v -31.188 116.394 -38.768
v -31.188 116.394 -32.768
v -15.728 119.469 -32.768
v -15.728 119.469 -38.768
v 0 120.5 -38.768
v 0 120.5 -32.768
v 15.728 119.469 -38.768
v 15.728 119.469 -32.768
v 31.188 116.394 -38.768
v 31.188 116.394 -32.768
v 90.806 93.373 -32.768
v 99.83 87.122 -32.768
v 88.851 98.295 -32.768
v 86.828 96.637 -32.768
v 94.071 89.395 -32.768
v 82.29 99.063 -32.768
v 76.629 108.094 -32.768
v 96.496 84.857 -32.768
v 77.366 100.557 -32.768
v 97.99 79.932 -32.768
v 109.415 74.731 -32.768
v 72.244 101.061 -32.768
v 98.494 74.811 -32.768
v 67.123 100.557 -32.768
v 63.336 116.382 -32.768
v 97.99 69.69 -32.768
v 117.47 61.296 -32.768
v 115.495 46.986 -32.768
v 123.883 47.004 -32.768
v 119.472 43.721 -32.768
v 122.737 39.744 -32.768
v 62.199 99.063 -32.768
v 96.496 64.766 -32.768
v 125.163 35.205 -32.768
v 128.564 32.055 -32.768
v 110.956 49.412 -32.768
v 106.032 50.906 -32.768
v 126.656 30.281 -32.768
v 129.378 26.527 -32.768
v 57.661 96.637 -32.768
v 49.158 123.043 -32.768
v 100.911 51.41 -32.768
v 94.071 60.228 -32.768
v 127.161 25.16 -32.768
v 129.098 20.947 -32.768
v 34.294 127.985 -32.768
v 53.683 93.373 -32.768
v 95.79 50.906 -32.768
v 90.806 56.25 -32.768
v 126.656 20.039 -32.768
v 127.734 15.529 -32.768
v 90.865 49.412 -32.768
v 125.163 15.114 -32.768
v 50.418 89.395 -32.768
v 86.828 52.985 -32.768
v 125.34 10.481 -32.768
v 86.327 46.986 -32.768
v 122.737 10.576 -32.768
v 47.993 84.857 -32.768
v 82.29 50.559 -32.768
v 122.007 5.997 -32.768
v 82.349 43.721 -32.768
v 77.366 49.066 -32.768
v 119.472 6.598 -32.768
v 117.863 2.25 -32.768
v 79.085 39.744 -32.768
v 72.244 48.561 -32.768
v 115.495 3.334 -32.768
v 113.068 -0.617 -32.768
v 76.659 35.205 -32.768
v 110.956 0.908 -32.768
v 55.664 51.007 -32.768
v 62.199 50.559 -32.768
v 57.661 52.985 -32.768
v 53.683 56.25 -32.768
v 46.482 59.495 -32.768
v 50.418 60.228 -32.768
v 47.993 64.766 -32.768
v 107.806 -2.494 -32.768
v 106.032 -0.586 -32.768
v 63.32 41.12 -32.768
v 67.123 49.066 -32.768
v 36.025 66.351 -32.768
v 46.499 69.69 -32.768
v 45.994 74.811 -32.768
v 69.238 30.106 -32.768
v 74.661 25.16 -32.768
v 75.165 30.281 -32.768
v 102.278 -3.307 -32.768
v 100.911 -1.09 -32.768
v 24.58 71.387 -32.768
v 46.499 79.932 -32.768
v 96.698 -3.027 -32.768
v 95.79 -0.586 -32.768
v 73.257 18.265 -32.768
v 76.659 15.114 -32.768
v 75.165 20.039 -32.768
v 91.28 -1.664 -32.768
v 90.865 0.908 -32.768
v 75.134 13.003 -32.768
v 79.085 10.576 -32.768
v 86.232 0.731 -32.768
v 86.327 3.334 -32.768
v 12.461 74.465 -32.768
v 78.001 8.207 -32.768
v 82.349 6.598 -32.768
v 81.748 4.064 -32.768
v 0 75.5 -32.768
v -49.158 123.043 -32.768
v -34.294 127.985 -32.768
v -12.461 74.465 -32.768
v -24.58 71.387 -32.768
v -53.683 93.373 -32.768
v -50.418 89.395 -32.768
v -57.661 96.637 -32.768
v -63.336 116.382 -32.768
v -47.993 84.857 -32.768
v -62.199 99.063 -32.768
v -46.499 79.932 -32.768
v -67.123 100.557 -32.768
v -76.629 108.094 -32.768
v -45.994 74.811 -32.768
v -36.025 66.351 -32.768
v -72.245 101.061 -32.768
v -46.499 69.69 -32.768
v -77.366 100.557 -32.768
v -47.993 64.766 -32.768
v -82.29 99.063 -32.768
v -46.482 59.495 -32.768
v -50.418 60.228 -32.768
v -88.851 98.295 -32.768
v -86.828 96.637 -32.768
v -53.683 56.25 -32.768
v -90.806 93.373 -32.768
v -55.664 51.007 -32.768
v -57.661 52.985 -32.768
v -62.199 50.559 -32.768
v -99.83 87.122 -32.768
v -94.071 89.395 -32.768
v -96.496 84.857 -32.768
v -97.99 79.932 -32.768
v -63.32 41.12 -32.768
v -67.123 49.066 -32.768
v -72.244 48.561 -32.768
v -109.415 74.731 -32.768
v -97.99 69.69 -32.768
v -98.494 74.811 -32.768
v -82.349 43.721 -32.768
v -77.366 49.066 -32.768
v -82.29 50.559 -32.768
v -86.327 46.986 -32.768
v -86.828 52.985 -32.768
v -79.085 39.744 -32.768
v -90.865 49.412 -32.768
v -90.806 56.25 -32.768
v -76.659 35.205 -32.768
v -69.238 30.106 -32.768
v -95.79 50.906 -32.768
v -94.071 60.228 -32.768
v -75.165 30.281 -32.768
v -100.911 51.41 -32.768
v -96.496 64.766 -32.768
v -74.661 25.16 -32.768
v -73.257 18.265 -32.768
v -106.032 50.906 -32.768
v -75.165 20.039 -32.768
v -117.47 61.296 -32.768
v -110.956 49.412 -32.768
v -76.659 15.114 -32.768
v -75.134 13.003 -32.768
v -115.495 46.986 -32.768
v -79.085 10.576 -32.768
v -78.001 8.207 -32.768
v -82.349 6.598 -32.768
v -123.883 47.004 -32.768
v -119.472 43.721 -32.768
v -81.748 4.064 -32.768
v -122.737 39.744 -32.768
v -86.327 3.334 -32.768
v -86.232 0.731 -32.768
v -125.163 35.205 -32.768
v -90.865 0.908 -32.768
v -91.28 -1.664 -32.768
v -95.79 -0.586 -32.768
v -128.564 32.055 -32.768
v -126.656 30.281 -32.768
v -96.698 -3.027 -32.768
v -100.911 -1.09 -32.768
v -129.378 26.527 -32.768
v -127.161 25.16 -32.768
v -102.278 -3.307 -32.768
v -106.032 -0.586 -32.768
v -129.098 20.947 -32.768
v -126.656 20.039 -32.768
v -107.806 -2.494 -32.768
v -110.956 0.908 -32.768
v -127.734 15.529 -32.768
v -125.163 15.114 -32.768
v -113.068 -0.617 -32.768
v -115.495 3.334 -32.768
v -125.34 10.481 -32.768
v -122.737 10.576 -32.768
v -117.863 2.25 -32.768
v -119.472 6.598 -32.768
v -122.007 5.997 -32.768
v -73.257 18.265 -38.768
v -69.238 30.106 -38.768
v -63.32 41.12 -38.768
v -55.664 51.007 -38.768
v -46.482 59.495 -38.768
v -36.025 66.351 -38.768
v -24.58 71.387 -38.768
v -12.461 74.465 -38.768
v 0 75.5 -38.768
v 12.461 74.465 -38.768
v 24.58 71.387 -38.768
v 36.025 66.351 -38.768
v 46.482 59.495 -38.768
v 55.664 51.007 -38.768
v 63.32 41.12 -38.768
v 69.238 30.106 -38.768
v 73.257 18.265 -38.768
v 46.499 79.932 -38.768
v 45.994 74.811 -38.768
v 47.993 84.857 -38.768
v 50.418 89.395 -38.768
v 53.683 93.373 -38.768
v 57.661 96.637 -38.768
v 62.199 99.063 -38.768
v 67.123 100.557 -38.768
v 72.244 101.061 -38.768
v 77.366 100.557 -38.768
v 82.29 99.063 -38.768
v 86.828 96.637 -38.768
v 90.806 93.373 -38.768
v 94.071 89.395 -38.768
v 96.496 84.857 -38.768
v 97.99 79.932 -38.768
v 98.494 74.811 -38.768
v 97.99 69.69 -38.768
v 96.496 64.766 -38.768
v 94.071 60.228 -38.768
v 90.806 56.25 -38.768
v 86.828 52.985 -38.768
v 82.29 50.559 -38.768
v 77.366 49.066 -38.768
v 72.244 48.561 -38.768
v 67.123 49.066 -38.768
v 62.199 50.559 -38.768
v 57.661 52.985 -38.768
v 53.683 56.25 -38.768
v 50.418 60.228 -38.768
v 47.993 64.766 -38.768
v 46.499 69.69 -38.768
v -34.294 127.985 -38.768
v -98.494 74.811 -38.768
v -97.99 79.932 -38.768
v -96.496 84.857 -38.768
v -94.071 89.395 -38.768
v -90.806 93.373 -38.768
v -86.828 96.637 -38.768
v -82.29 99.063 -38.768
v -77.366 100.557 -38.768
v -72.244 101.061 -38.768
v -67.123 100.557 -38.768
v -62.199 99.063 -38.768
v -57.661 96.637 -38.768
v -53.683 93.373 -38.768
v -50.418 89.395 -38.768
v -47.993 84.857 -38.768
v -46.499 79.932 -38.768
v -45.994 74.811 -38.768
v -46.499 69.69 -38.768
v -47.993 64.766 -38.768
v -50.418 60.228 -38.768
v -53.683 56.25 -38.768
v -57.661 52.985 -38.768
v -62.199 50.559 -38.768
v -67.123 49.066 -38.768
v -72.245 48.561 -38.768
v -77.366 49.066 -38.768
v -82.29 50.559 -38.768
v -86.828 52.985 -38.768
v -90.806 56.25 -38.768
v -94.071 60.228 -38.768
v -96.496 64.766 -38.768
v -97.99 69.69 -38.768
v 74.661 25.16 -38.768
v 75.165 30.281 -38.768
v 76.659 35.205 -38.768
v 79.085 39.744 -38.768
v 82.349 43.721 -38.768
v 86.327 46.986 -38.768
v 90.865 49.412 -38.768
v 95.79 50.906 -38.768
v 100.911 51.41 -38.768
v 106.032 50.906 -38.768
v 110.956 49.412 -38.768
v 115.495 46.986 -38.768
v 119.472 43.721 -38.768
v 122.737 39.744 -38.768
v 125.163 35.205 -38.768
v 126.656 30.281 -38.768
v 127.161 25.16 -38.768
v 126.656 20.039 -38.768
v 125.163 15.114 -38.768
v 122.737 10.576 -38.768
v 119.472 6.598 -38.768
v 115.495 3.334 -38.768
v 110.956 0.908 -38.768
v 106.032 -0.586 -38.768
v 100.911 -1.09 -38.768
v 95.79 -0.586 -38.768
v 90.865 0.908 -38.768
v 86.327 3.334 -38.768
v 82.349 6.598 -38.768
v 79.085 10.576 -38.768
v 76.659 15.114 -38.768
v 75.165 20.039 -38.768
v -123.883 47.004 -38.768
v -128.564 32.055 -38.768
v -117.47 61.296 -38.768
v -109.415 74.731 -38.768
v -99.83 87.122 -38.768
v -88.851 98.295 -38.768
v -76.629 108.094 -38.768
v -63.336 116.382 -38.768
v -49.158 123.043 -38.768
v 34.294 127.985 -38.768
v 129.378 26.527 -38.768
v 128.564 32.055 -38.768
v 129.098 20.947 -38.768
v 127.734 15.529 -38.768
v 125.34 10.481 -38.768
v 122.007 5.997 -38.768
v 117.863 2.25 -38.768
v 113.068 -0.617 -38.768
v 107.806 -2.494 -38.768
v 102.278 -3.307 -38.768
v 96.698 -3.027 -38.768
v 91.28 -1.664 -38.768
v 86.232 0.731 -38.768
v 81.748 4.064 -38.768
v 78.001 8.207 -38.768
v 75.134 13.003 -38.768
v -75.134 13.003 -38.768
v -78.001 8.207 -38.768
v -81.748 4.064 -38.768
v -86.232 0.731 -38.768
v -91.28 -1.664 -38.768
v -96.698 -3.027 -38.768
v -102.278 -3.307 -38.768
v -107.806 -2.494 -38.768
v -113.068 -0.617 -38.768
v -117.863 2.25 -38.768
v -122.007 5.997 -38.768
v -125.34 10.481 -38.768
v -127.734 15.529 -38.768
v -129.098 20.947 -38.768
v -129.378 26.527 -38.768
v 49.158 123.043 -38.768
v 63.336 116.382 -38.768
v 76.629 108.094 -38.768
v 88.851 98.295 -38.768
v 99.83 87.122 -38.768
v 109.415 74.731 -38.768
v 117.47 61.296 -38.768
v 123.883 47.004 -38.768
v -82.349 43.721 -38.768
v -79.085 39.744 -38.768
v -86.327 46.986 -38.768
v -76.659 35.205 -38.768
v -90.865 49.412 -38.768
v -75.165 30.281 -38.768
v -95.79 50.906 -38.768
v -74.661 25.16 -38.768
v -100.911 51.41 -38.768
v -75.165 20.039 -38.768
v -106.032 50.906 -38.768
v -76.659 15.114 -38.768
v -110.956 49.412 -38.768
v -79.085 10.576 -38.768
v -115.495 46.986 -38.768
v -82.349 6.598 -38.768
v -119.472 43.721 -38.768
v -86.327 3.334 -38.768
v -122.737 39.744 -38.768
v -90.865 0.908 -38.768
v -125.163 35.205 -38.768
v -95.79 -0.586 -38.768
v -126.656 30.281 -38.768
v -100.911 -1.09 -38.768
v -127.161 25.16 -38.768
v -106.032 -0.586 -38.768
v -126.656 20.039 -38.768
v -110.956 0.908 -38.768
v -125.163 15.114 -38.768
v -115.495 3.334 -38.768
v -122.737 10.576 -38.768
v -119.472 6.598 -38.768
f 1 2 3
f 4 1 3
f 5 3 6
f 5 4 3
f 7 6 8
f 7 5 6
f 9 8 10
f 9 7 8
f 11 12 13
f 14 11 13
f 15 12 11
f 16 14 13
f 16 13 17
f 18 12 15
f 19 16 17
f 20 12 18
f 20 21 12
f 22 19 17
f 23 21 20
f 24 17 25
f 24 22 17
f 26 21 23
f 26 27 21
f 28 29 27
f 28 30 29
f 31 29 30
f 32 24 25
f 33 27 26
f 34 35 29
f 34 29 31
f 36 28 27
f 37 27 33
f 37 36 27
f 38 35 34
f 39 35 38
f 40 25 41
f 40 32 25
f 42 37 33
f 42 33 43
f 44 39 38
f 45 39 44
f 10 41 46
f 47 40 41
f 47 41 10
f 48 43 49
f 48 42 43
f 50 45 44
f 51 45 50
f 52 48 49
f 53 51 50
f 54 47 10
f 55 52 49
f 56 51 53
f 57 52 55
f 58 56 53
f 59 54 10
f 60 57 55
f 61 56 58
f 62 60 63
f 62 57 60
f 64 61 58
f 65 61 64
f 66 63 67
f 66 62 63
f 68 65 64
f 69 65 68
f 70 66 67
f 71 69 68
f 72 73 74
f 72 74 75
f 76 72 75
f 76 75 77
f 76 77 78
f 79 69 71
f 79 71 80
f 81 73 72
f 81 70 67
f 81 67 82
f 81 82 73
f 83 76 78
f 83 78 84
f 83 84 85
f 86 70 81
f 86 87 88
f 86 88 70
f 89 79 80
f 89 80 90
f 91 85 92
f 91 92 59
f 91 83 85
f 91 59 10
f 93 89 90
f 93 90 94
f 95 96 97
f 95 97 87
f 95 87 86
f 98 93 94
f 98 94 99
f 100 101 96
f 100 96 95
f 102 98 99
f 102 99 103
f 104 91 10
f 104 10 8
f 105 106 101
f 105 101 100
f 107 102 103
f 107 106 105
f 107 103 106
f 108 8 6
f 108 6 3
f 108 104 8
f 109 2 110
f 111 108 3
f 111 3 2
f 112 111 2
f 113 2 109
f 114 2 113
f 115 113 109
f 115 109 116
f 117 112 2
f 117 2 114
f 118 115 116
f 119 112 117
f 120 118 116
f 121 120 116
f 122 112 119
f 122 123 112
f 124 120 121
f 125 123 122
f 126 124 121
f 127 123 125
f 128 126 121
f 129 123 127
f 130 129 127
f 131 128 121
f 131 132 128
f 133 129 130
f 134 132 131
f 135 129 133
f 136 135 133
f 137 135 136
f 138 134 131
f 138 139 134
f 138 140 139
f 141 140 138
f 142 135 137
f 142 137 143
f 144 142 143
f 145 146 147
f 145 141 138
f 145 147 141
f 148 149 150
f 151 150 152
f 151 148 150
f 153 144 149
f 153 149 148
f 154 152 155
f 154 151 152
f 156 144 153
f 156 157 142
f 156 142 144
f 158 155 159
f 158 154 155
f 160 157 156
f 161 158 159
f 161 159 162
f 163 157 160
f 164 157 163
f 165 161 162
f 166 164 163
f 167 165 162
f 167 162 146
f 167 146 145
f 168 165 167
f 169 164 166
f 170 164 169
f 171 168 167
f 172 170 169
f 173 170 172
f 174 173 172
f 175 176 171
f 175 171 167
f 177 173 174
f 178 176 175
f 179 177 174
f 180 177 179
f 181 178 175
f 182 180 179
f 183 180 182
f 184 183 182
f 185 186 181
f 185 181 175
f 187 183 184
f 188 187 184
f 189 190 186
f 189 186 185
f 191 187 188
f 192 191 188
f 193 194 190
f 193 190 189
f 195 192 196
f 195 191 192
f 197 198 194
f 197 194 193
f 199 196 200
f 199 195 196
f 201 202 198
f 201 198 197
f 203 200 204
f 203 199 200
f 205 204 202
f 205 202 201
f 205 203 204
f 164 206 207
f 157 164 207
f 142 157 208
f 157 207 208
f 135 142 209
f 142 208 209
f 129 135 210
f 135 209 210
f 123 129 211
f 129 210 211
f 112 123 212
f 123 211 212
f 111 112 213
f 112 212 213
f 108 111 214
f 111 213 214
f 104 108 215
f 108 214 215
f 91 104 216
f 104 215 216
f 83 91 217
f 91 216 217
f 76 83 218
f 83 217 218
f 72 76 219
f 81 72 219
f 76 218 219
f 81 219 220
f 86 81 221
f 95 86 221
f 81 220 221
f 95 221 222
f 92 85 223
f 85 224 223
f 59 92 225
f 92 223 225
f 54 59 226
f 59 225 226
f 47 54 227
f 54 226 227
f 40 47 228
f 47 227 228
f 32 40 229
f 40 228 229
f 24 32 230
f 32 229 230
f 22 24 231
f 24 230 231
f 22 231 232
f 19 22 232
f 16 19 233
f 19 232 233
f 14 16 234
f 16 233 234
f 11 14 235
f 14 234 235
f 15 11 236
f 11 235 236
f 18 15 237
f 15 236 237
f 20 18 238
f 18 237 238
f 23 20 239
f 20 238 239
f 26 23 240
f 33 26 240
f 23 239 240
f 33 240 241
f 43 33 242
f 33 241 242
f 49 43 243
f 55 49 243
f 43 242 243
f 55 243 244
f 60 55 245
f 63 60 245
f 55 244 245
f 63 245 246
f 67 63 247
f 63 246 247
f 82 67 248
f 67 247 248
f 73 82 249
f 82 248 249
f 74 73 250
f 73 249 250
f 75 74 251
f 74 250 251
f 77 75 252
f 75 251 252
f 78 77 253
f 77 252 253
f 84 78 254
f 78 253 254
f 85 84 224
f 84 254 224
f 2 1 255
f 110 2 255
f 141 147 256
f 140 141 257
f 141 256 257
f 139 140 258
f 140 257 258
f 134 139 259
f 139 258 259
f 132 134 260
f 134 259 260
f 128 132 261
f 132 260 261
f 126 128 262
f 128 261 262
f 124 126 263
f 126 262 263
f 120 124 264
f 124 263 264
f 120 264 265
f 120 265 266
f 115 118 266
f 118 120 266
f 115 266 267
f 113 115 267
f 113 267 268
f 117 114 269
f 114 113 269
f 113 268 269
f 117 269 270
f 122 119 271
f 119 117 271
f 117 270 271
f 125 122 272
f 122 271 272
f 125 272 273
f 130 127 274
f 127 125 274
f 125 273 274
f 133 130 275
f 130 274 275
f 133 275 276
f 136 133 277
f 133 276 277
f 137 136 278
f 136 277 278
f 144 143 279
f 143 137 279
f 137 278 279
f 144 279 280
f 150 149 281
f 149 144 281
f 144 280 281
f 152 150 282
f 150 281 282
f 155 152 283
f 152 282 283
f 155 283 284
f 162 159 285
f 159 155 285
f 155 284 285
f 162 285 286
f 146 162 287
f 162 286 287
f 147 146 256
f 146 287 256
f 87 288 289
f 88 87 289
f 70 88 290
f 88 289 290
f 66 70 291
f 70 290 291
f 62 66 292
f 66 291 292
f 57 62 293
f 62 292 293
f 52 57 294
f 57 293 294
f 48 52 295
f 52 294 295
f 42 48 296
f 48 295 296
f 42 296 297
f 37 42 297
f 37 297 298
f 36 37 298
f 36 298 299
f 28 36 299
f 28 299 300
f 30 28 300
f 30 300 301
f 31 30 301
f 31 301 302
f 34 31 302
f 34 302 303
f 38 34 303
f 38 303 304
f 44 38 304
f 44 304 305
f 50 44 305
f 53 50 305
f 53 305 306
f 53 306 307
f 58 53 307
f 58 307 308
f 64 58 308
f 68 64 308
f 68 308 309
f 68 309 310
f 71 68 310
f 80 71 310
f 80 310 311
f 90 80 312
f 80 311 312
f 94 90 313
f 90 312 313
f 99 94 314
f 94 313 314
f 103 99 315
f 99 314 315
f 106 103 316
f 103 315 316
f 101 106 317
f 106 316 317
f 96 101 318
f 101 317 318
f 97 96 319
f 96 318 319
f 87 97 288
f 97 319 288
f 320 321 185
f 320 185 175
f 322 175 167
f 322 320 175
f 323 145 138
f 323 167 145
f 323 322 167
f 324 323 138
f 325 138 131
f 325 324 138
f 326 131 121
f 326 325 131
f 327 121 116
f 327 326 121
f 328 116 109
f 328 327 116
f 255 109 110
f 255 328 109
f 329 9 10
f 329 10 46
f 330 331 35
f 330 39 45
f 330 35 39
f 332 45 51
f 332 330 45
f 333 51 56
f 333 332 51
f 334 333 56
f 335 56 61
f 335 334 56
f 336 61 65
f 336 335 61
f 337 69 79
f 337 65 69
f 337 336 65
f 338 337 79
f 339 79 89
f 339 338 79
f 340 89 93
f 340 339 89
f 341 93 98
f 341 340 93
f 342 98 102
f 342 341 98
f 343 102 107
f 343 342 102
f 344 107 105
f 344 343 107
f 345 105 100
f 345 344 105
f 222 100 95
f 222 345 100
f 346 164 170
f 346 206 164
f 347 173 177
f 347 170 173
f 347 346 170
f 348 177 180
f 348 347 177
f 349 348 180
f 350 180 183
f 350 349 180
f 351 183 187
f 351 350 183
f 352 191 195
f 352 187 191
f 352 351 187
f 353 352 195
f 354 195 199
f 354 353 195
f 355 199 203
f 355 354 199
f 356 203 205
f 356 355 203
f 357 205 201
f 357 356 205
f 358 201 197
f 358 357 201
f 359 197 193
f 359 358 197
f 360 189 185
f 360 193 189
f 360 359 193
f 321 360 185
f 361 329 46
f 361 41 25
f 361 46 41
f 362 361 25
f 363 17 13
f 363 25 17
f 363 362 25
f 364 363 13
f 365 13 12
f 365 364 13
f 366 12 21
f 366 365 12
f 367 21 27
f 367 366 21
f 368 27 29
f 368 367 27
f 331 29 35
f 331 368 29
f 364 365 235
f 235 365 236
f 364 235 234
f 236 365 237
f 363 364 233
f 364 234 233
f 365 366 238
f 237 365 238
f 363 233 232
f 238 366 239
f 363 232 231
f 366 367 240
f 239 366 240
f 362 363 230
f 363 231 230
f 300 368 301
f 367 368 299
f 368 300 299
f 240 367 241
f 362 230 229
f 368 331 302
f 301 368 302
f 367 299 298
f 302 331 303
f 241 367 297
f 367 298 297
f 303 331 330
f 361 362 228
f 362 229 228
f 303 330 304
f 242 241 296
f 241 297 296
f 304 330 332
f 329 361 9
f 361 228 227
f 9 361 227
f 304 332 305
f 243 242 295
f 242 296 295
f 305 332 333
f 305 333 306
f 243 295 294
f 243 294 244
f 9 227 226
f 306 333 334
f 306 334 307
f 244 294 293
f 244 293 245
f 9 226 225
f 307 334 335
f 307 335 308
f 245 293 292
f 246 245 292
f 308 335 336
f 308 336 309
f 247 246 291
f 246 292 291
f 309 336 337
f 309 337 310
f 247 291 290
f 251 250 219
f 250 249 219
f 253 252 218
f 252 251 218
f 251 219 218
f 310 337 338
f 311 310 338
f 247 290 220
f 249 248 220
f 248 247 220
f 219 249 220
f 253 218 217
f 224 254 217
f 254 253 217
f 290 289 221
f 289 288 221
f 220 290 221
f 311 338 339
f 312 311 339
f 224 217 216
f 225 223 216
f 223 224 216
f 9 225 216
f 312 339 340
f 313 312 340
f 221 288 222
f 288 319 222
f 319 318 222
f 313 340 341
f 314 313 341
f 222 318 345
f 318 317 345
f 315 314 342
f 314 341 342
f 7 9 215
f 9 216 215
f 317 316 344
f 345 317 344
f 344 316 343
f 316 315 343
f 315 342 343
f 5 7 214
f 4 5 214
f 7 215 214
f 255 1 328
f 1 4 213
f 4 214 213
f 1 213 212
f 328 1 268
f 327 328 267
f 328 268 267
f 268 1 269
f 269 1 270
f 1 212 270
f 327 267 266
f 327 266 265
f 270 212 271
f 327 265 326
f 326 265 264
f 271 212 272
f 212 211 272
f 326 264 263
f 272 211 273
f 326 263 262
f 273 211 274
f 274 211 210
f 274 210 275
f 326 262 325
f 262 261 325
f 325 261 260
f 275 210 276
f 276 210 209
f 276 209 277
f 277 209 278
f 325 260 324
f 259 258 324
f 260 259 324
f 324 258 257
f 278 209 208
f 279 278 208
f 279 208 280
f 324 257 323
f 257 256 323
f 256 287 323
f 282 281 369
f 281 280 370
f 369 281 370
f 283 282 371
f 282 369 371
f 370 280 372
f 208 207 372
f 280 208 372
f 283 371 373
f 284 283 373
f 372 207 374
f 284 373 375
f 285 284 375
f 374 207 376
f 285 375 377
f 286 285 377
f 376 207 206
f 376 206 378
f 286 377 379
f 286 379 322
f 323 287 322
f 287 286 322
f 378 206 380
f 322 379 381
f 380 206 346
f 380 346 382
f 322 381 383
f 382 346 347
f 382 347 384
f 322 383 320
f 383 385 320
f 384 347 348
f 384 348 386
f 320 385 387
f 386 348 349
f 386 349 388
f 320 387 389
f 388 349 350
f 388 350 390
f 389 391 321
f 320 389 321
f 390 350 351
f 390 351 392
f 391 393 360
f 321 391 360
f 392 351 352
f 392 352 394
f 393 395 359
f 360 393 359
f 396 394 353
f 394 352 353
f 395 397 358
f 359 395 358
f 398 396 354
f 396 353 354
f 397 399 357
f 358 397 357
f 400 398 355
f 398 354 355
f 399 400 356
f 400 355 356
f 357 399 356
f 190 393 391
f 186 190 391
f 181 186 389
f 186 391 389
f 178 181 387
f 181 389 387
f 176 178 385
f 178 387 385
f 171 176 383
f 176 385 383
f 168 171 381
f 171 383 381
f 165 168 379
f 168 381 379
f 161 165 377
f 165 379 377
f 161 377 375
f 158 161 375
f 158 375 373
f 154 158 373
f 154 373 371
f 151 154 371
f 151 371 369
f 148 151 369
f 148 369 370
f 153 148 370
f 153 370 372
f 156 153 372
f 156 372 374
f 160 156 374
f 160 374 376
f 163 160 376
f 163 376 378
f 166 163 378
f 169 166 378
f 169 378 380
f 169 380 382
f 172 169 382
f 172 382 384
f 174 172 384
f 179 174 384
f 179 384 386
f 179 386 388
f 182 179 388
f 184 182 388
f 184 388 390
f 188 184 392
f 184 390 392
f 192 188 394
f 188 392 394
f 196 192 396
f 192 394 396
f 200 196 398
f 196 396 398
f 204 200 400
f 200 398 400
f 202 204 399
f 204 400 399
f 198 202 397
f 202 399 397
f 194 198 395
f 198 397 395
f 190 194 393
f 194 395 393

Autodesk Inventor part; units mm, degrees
ref_plane "YZ Plane" through (0, 0, 0) normal (1, 0, 0) x (0, 1, 0)
ref_plane "XZ Plane" through (0, 0, 0) normal (0, 1, 0) x (-1, 0, 0)
ref_plane "РабПлоскость2" through (0, 0, -38.7685) normal (0, 0, 1) x (-1, 0, 0)
sketch "Эскиз2" plane through (0, 0, -38.7685) normal (0, 0, 1) x (-1, 0, 0)
  line L0 (0, 0) -> (0, -166.5002) construction
  circle A0 centre (72.2445, -74.8113) radius 26 construction
  circle A1 centre (100.9108, -25.1599) radius 26 construction
  circle A2 centre (-72.2445, -74.8113) radius 26 construction
  circle A3 centre (-100.9108, -25.1599) radius 26 construction
  circle A4 centre (72.2445, -74.8113) radius 26.25
  circle A5 centre (100.9108, -25.1599) radius 26.25
  circle A6 centre (-72.2445, -74.8113) radius 26.25
  circle A7 centre (-100.9108, -25.1599) radius 26.25
  circle A8 centre (0, 0) radius 132.5 projected
  circle A9 centre (0, 0) radius 75.5
  circle A10 centre (100.9108, -25.1599) radius 28.5
  circle A11 centre (-100.9108, -25.1599) radius 28.5
  circle A12 centre (0, 0) radius 120.5
  line L1 (0, 0) -> (-34.2935, -127.9852)
  line L2 (0, 0) -> (34.2935, -127.9852)
  point P0 (-128.5642, -32.0547)
  point P1 (128.5642, -32.0547)
  point P2 (73.2573, -18.2651)
  point P3 (-73.2573, -18.2651)
  point P4 (-31.1877, -116.3941)
  point P5 (31.1877, -116.3941)
  dimension "d0" = 52.5
  dimension "d2" = 151
  dimension "d5" = 30
  dimension "d6" = 12
extrude "Выдавливание1" add sketch "Эскиз2" along normal blind 6 contours A4 A12 A10 A8 L2 | A4 A12 L2 A9 A10 | A12 A5 A10 | A10 A12 A5 | A12 L1 A9 L2 | L1 A8 A11 A12 A6 | A12 A6 A11 A9 L1 | A11 A12 A7 | A11 A12 A7
properties part number "Диск_фиксатор"
